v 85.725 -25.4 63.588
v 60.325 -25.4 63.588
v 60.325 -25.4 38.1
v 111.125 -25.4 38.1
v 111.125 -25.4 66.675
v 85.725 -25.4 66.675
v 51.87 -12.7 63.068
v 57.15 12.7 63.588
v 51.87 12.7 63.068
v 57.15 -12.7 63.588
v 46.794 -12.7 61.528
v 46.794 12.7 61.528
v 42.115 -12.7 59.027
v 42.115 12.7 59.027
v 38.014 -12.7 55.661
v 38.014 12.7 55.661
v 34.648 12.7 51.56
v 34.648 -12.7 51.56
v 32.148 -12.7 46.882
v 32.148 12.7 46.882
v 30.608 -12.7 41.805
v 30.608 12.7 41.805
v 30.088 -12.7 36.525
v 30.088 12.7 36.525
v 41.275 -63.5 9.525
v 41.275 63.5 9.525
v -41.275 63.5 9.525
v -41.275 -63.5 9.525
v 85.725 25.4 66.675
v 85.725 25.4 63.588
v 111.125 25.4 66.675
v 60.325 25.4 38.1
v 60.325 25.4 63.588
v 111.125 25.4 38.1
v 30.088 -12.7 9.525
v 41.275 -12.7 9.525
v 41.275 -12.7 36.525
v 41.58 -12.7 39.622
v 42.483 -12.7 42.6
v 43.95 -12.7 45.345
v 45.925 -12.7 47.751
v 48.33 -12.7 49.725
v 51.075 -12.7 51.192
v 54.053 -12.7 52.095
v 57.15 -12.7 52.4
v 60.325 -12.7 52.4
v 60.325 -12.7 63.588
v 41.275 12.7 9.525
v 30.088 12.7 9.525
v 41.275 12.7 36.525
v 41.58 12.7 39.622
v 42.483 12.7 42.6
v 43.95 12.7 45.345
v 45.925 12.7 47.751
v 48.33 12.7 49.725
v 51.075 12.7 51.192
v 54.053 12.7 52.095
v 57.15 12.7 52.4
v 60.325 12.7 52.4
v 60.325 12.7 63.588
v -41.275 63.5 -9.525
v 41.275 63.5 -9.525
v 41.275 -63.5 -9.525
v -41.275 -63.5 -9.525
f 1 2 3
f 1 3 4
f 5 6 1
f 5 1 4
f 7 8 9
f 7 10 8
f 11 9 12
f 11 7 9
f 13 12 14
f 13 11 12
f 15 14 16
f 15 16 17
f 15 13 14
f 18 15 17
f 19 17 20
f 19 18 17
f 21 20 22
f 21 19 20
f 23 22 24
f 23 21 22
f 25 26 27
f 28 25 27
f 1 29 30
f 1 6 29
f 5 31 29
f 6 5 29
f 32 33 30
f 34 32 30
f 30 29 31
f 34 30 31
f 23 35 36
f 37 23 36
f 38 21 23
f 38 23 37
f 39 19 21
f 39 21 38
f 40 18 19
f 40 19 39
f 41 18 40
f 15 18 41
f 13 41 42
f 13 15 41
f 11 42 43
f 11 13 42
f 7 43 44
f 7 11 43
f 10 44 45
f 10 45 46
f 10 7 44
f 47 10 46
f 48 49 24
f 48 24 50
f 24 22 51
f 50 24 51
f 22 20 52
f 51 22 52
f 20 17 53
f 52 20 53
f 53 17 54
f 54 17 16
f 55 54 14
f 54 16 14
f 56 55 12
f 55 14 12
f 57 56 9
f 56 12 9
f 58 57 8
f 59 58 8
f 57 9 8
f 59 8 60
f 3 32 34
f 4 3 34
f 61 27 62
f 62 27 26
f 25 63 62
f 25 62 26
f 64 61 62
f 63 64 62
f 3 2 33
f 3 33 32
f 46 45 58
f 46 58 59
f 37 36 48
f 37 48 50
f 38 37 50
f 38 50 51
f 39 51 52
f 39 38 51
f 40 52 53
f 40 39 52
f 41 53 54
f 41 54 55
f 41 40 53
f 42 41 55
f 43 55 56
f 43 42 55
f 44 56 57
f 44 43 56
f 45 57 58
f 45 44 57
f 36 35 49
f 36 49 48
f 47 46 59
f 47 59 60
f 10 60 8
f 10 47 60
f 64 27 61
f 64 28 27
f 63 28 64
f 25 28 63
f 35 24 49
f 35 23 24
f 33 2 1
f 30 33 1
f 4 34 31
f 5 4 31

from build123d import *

# Parameters (mm, degrees)
F1_DEPTH = 63.5
F0_W     = 25.4
F0_H     = 14.3002
F0_H_2   = 11.1874153703
F2_DEPTH = 25.4
F3_DEPTH = 12.7


with BuildPart() as f1:
    # F0 (on Front) → F1 (new body, symmetric)
    with BuildSketch(Plane.XZ):
        Polygon((30.0875846297, 9.525), (-41.275, 9.525), (-41.275, -9.525), (41.275, -9.525), (41.275, 9.525), align=None)
    extrude(amount=F1_DEPTH, both=True)


with BuildPart() as f2:
    # F0 (on Front) → F2 (new body, symmetric)
    with BuildSketch(Plane.XZ):
        Polygon((85.725, 66.675), (85.725, 63.5876153703), (85.725, 52.4002), (85.725, 38.1), (111.125, 38.1), (111.125, 66.675), align=None)
        with Locations((73.025, 45.2501)):
            Rectangle(F0_W, F0_H)
        with Locations((73.025, 57.9939076852)):
            Rectangle(F0_W, F0_H_2)
    extrude(amount=F2_DEPTH, both=True)


with BuildPart() as f3:
    # F0 (on Front) → F3 (new body, symmetric)
    with BuildSketch(Plane.XZ):
        with BuildLine():
            Line((30.0875846297, 36.5252), (30.0875846297, 9.525))
            Line((30.0875846297, 9.525), (41.275, 9.525))
            Line((41.275, 9.525), (41.275, 36.5252))
            ThreePointArc((41.275, 36.5252), (45.9246798487, 47.7505201513), (57.15, 52.4002))
            Line((57.15, 52.4002), (60.325, 52.4002))
            Line((60.325, 52.4002), (60.325, 63.5876153703))
            Line((60.325, 63.5876153703), (57.15, 63.5876153703))
            ThreePointArc((57.15, 63.5876153703), (38.0139825763, 55.6612174237), (30.0875846297, 36.5252))
        make_face()
    extrude(amount=F3_DEPTH, both=True)


solid = Compound([f1.part, f2.part, f3.part])
